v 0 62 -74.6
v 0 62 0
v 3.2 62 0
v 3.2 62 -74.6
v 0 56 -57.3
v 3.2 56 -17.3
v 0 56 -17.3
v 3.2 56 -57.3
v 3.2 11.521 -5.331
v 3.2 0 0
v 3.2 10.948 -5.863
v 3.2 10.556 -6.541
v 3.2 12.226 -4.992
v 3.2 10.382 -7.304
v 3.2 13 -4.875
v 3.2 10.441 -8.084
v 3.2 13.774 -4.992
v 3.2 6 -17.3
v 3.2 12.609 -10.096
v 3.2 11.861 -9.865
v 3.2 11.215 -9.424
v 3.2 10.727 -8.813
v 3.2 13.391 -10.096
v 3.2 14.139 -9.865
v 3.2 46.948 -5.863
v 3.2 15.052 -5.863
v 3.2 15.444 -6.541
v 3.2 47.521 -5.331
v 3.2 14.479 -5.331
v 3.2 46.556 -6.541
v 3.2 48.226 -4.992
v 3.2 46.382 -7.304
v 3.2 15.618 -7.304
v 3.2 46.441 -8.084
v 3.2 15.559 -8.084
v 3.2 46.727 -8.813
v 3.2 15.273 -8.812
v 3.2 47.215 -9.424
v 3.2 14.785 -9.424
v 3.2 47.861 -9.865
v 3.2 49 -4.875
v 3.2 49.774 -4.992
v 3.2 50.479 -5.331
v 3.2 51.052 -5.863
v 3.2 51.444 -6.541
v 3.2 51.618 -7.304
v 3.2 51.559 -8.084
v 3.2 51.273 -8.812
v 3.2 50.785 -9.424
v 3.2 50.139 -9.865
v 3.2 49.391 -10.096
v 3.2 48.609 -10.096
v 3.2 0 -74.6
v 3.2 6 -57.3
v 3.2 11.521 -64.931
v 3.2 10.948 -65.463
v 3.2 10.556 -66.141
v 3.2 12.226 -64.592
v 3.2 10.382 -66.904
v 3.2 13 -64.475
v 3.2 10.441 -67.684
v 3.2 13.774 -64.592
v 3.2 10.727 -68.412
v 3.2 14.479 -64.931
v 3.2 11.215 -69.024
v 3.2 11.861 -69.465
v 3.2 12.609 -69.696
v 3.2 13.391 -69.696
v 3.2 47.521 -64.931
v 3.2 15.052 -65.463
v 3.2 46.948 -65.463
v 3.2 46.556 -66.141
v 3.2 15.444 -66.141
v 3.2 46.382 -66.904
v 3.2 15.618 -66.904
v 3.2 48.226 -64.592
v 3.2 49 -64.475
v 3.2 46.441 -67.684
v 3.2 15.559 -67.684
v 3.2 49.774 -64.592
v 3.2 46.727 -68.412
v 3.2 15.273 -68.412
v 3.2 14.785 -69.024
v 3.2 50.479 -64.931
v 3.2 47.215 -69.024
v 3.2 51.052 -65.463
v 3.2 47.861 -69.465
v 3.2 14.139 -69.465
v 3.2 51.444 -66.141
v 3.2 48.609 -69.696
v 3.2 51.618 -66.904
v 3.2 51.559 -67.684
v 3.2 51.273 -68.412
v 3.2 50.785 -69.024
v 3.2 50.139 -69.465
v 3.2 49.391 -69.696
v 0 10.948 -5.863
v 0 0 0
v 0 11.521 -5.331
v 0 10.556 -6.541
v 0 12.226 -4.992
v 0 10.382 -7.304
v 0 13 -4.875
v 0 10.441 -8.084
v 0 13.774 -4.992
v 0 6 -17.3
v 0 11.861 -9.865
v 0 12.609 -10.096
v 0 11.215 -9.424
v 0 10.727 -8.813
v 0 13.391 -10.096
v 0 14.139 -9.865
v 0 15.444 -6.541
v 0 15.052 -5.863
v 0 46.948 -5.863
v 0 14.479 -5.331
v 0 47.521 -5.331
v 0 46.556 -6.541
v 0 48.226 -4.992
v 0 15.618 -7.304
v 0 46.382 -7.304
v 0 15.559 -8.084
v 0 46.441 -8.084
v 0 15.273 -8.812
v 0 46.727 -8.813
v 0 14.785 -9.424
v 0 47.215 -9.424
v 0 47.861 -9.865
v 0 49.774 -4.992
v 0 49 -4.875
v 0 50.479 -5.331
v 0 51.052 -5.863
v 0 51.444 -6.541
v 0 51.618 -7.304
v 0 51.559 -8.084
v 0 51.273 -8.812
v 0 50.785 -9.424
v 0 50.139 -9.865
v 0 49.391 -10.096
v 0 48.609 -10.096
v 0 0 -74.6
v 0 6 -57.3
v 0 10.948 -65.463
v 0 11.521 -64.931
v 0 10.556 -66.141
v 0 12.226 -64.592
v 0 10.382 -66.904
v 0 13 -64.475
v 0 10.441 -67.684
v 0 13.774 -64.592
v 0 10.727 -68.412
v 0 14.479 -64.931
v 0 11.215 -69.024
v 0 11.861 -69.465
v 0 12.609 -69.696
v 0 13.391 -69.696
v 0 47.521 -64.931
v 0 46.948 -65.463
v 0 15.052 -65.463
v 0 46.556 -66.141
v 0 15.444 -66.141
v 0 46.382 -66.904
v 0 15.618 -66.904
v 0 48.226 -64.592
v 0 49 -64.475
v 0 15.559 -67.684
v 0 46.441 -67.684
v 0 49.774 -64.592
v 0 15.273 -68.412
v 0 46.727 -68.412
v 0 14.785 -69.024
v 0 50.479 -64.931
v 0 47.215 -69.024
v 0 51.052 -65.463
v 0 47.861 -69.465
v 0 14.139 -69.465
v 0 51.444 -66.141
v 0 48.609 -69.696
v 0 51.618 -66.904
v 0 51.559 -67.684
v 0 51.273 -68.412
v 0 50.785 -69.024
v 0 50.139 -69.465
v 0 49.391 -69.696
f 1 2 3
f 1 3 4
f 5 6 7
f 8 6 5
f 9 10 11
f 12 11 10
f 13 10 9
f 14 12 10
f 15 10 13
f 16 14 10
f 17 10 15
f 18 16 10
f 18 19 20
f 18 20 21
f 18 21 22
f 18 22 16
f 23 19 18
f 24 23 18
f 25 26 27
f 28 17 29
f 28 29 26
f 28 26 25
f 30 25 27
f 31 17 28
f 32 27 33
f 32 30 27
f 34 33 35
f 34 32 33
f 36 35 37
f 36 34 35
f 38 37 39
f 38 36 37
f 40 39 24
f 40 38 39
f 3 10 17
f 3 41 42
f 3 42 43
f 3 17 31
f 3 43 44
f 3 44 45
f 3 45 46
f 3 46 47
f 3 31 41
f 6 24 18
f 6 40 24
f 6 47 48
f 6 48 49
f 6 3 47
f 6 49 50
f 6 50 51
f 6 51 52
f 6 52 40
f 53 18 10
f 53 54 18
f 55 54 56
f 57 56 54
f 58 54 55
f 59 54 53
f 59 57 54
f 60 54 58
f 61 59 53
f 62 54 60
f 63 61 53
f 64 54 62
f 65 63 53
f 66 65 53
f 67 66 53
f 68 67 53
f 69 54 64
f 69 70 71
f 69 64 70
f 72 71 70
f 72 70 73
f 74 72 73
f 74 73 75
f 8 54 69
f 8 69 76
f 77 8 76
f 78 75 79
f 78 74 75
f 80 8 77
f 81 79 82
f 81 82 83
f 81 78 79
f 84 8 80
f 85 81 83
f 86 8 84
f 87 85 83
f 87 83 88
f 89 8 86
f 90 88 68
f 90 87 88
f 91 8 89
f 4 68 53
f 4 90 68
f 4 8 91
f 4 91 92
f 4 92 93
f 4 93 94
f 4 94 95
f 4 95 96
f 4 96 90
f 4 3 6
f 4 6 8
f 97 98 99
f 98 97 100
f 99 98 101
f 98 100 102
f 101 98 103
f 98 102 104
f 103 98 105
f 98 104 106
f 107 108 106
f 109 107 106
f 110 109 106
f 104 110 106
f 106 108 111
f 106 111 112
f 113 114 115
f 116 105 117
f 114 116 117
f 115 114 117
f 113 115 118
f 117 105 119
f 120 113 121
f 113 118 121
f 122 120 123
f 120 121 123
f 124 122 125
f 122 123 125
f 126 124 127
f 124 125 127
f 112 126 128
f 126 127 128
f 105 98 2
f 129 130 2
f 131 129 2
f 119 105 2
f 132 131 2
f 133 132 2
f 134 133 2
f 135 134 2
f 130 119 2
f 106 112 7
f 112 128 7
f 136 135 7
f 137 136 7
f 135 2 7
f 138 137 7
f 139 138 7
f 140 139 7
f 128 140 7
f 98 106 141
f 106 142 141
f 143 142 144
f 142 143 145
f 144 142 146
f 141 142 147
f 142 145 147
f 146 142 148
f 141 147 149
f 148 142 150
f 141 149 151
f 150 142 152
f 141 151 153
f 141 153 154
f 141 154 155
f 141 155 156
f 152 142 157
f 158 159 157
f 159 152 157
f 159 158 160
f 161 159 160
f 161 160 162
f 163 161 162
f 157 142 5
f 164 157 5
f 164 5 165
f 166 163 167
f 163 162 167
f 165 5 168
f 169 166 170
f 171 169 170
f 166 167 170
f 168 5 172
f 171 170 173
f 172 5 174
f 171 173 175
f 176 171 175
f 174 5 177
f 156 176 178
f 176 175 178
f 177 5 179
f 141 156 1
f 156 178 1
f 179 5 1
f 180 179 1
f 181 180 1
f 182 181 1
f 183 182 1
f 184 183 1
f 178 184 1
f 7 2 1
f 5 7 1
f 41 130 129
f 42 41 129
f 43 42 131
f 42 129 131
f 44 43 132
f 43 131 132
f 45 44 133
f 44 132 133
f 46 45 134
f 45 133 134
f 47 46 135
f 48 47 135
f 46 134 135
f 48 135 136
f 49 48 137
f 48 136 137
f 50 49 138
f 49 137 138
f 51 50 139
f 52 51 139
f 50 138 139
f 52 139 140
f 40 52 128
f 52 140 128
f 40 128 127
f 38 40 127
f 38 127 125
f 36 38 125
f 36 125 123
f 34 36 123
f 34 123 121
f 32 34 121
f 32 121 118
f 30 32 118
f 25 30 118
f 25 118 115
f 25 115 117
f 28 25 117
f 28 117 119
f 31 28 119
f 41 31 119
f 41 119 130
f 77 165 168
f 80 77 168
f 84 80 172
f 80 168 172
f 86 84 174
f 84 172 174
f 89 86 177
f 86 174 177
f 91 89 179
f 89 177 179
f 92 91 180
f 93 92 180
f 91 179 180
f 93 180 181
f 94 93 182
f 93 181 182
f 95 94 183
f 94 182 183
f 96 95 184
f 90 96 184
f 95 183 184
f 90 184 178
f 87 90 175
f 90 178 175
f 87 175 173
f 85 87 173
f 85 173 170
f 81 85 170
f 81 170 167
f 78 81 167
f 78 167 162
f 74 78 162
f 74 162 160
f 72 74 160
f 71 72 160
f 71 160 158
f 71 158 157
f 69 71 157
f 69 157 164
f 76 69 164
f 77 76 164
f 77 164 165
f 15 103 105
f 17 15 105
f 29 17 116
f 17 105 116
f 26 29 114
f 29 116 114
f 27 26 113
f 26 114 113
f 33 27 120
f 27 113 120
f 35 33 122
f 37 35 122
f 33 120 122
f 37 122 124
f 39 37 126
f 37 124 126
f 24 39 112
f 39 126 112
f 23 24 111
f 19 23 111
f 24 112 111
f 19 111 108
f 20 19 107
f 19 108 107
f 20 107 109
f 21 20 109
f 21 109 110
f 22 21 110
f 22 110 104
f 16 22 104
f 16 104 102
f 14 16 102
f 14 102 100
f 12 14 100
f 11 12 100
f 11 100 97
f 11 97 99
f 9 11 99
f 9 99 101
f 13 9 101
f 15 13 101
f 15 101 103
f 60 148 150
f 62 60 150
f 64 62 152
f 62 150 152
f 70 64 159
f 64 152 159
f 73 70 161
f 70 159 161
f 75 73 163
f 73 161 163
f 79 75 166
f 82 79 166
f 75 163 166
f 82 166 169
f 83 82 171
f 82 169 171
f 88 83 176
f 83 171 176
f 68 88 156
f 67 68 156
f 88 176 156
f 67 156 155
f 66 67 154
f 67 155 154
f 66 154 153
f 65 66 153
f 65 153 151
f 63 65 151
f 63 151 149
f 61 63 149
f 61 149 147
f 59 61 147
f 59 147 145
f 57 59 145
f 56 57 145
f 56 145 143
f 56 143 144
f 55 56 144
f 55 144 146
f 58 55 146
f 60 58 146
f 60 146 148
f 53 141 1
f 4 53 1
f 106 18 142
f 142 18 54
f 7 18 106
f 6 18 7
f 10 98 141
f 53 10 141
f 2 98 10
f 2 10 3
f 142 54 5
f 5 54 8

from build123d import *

# Parameters (mm, degrees)
SKETCH1_W           = 74.6
SKETCH1_H           = 62
BOSS_EXTRUDE1_DEPTH = 3.2
CUT_EXTRUDE1_REACH  = 5.2
SKETCH2_W           = 40
SKETCH2_H           = 50
CUT_EXTRUDE2_REACH  = 5.2
SKETCH3_R           = 2.625


with BuildPart() as part:
    # Sketch1 → Boss-Extrude1 (new body)
    with BuildSketch(Plane(origin=(0, 0, 0), x_dir=(0, 0, -1), z_dir=(1, 0, 0))):
        with Locations((37.3, 31)):
            Rectangle(SKETCH1_W, SKETCH1_H)
    extrude(amount=BOSS_EXTRUDE1_DEPTH)

    # Sketch2 → Cut-Extrude1 (cut, up to next)
    with BuildSketch(Plane(origin=(3.2, 0, 0), x_dir=(0, 0, -1), z_dir=(1, 0, 0)), mode=Mode.PRIVATE) as cut_extrude1_sk1:
        with Locations((37.3, 31)):
            Rectangle(SKETCH2_W, SKETCH2_H)
    cut_extrude1_tool1 = extrude(cut_extrude1_sk1.sketch, amount=-CUT_EXTRUDE1_REACH, mode=Mode.PRIVATE) & part.part
    add(cut_extrude1_tool1.solids().sort_by_distance((3.2, 31, -37.3))[0], mode=Mode.SUBTRACT)

    # Sketch3 → Cut-Extrude2 (cut, up to next)
    with BuildSketch(Plane.ZY, mode=Mode.PRIVATE) as cut_extrude2_sk1:
        with Locations((-67.1, 13)):
            Circle(SKETCH3_R)
    cut_extrude2_tool1 = extrude(cut_extrude2_sk1.sketch, amount=-CUT_EXTRUDE2_REACH, mode=Mode.PRIVATE) & part.part
    add(cut_extrude2_tool1.solids().sort_by_distance((0, 13, -67.1))[0], mode=Mode.SUBTRACT)
    # Sketch3 → Cut-Extrude2 (cut, up to next)
    with BuildSketch(Plane.ZY, mode=Mode.PRIVATE) as cut_extrude2_sk2:
        with Locations((-67.1, 49)):
            Circle(SKETCH3_R)
    cut_extrude2_tool2 = extrude(cut_extrude2_sk2.sketch, amount=-CUT_EXTRUDE2_REACH, mode=Mode.PRIVATE) & part.part
    add(cut_extrude2_tool2.solids().sort_by_distance((0, 49, -67.1))[0], mode=Mode.SUBTRACT)
    # Sketch3 → Cut-Extrude2 (cut, up to next)
    with BuildSketch(Plane.ZY, mode=Mode.PRIVATE) as cut_extrude2_sk3:
        with Locations((-7.5, 49)):
            Circle(SKETCH3_R)
    cut_extrude2_tool3 = extrude(cut_extrude2_sk3.sketch, amount=-CUT_EXTRUDE2_REACH, mode=Mode.PRIVATE) & part.part
    add(cut_extrude2_tool3.solids().sort_by_distance((0, 49, -7.5))[0], mode=Mode.SUBTRACT)
    # Sketch3 → Cut-Extrude2 (cut, up to next)
    with BuildSketch(Plane.ZY, mode=Mode.PRIVATE) as cut_extrude2_sk4:
        with Locations((-7.5, 13)):
            Circle(SKETCH3_R)
    cut_extrude2_tool4 = extrude(cut_extrude2_sk4.sketch, amount=-CUT_EXTRUDE2_REACH, mode=Mode.PRIVATE) & part.part
    add(cut_extrude2_tool4.solids().sort_by_distance((0, 13, -7.5))[0], mode=Mode.SUBTRACT)


solid = part.part
